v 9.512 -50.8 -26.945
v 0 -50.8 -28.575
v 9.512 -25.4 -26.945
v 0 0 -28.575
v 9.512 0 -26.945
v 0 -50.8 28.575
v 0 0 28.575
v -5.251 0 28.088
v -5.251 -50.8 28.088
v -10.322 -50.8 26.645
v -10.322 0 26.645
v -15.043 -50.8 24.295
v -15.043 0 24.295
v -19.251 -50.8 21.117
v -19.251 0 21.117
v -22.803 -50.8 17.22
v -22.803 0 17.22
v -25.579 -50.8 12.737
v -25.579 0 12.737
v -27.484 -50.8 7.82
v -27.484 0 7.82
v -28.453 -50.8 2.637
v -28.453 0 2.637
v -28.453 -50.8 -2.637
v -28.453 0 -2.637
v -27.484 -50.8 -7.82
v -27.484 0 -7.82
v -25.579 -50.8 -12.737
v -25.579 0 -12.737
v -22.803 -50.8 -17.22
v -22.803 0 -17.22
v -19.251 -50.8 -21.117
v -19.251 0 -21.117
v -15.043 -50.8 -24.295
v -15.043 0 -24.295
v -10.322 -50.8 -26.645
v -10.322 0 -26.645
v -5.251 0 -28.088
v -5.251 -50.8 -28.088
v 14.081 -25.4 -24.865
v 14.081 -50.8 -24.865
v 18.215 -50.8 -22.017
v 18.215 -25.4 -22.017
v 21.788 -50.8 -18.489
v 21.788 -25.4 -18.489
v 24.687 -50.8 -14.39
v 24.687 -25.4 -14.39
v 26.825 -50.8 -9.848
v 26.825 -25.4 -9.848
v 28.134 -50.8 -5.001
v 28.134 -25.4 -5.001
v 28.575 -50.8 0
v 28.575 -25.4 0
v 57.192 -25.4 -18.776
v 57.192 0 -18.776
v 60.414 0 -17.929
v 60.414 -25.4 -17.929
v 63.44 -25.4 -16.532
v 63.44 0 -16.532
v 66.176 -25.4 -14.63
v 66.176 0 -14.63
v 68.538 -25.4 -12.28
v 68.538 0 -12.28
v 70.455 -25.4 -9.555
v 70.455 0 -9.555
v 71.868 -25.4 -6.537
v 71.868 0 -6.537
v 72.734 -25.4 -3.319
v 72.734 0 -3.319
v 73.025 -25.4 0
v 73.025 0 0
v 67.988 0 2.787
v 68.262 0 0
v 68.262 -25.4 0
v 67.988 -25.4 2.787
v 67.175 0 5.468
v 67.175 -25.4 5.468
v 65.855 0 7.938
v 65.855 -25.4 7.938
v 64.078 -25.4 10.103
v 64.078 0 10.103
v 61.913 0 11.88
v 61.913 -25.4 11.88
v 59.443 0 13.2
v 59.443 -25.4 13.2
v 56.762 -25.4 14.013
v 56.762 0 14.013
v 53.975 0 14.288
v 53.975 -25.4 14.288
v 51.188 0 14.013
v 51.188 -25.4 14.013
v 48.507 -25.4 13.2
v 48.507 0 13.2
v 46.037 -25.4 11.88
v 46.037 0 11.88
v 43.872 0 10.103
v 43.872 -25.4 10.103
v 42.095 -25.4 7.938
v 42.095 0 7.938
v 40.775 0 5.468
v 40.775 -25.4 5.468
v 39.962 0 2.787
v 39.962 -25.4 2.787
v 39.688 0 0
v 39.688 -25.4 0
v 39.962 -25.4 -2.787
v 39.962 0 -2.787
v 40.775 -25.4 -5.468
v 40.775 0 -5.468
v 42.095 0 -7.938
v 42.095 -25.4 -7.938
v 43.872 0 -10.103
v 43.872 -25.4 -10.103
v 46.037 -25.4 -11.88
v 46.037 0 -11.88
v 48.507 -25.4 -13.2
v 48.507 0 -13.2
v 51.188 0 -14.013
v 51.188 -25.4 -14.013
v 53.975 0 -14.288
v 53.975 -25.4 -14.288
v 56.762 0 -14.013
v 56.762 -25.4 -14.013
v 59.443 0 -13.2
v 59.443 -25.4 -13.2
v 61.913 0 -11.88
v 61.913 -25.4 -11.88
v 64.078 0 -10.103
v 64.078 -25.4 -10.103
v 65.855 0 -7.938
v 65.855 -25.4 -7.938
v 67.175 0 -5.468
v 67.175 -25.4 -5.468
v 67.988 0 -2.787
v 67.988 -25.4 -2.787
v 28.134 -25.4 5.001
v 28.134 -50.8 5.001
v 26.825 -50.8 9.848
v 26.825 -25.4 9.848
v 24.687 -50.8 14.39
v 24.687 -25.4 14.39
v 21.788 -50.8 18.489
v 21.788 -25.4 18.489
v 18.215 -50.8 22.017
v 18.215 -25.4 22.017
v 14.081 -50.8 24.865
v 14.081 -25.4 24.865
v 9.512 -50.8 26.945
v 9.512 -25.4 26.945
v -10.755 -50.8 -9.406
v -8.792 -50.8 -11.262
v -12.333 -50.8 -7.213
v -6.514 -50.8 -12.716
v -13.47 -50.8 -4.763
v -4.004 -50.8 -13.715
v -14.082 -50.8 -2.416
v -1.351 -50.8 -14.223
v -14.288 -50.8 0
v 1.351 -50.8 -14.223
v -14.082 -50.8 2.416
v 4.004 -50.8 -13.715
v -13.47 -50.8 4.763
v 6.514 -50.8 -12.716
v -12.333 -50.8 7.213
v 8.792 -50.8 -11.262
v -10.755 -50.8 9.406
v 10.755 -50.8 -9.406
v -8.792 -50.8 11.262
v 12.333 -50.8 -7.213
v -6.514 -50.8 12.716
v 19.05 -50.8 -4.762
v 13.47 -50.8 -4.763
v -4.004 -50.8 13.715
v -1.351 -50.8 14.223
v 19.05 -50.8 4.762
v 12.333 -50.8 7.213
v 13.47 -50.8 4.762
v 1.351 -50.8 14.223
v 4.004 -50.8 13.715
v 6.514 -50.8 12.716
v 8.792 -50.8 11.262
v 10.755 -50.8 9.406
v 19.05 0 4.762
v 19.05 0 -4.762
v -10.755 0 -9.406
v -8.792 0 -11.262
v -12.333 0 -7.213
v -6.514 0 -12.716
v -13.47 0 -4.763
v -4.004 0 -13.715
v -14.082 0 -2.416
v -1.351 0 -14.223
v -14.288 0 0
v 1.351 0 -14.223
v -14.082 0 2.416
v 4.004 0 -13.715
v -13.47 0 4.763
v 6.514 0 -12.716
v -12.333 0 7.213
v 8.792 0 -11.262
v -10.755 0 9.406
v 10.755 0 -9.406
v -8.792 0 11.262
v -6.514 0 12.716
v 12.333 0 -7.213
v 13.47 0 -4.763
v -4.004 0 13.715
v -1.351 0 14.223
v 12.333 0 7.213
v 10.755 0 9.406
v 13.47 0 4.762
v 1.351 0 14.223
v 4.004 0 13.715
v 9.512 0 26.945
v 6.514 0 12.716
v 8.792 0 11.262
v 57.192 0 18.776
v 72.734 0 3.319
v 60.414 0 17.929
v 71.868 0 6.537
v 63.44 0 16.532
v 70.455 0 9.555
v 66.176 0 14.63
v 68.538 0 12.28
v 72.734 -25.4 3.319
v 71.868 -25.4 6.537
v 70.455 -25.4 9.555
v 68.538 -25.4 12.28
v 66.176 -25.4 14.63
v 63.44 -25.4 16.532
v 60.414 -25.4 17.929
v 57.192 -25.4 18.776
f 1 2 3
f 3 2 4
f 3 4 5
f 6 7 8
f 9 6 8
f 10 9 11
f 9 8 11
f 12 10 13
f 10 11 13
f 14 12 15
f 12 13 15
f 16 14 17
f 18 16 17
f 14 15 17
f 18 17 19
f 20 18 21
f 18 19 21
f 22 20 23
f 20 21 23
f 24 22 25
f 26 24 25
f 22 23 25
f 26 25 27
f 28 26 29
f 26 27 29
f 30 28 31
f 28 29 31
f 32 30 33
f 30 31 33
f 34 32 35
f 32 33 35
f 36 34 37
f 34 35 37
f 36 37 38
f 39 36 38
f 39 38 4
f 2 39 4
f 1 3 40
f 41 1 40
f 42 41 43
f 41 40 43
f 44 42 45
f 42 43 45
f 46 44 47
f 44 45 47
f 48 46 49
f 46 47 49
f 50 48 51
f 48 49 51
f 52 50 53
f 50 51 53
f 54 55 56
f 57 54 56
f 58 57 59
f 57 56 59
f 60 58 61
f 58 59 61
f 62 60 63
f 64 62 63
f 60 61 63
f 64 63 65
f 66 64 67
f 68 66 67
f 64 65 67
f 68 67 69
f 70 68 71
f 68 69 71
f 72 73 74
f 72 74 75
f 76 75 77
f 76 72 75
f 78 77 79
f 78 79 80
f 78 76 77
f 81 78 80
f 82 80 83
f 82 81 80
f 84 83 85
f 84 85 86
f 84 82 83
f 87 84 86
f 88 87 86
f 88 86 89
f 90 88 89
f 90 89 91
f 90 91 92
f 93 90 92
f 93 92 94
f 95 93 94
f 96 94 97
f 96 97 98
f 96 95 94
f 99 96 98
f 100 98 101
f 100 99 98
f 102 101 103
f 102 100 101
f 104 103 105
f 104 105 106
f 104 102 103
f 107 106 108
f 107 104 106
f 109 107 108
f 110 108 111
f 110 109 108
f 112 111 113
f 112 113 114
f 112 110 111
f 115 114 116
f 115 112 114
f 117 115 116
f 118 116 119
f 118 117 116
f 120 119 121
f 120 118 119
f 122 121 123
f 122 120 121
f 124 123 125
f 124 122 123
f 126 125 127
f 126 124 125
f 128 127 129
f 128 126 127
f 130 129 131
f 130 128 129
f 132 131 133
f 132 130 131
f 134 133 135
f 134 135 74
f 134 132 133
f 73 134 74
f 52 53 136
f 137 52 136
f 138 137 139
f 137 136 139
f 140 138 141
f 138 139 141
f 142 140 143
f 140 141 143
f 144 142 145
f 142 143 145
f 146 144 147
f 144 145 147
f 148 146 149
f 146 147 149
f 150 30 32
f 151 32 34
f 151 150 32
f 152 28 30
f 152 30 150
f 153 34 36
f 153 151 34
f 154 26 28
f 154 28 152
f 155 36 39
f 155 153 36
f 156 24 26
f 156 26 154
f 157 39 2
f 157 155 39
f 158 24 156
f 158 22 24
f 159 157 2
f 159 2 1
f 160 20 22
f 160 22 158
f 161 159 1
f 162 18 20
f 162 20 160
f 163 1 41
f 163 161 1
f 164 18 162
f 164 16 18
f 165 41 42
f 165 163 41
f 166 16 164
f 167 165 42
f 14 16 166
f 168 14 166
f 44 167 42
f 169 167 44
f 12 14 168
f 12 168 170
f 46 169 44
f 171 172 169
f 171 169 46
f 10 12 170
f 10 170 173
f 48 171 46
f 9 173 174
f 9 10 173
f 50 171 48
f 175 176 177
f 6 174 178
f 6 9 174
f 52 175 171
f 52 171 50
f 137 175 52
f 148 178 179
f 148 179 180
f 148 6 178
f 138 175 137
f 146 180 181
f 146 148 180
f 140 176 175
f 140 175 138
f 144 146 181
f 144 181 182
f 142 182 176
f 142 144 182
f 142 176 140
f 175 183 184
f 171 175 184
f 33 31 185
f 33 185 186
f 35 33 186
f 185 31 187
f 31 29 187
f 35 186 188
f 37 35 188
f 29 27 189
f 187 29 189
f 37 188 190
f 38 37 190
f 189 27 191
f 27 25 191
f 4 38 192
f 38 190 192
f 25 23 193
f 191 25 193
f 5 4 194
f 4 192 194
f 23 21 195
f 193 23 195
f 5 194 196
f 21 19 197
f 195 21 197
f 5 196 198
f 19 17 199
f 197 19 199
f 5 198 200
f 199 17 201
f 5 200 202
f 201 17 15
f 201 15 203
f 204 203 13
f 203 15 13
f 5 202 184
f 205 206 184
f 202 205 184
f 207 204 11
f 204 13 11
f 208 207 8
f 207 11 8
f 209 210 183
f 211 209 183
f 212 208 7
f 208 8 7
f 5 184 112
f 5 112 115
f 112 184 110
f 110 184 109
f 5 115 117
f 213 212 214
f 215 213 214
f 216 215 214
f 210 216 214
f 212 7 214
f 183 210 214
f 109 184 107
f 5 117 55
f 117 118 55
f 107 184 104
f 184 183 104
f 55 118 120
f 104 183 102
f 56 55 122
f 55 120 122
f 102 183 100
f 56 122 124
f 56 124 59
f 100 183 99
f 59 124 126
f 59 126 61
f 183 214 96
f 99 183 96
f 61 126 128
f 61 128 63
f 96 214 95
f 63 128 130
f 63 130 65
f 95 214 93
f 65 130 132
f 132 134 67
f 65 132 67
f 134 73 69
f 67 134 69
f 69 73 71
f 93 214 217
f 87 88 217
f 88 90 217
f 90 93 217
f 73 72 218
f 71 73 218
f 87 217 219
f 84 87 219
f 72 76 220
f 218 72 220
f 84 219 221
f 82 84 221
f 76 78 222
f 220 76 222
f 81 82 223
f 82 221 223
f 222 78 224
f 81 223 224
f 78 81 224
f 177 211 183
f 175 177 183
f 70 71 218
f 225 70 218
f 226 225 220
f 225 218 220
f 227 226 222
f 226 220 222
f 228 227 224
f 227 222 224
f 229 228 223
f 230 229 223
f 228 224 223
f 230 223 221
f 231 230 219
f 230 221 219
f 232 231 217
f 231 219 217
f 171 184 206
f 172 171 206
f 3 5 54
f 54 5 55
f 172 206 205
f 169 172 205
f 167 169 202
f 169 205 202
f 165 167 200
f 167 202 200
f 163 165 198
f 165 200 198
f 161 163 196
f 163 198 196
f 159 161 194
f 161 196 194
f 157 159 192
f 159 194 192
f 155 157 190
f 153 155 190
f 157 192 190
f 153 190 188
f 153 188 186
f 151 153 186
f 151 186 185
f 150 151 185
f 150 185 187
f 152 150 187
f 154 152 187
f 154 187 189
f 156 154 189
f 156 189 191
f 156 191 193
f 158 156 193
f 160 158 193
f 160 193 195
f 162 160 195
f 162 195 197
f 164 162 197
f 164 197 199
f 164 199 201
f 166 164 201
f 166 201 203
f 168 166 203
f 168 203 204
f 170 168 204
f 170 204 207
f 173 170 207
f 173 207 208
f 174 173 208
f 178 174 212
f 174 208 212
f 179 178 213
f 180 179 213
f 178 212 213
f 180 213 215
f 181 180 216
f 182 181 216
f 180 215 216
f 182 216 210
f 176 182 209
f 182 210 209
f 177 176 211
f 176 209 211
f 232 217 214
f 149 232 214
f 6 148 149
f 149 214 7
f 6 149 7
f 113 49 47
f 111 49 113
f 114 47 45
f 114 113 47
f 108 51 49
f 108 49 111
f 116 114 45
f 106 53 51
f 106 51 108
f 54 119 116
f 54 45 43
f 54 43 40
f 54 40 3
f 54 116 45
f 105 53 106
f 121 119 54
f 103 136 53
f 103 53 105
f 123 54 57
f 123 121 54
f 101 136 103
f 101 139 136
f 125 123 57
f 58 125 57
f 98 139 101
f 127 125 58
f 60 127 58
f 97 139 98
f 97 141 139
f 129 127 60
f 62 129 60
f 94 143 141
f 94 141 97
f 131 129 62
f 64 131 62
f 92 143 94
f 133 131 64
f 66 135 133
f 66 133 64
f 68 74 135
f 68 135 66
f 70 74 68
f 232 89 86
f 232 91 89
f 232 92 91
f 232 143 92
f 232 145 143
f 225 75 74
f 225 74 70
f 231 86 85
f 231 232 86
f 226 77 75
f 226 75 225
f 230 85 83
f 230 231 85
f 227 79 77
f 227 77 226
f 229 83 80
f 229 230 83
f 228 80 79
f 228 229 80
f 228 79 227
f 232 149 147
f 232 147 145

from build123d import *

# Parameters (mm, degrees)
F0_R     = 14.2875
F1_DEPTH = 25.4
F2_DEPTH = 50.8


with BuildPart() as f1:
    # F0 (on Front) → F1 (new body)
    with BuildSketch(Plane.XZ):
        with BuildLine():
            Line((9.5121844836, 26.9452959039), (0, 28.575))
            ThreePointArc((0, 28.575), (-28.575, 0), (0, -28.575))
            Line((0, -28.575), (9.5121844836, -26.9452959039))
            ThreePointArc((9.5121844836, -26.9452959039), (23.3274655355, -16.5033322905), (28.575, 0))
            ThreePointArc((28.575, 0), (23.3274655355, 16.5033322905), (9.5121844836, 26.9452959039))
        make_face()
        with BuildLine():
            ThreePointArc((-13.4703841816, 4.7625), (0, 14.2875), (13.4703841816, 4.7625))
            Line((13.4703841816, 4.7625), (19.05, 4.7625))
            Line((19.05, 4.7625), (19.05, -4.7625))
            Line((19.05, -4.7625), (13.4703841816, -4.7625))
            ThreePointArc((13.4703841816, -4.7625), (0, -14.2875), (-13.4703841816, -4.7625))
            Line((-13.4703841816, -4.7625), (-19.05, -4.7625))
            Line((-19.05, -4.7625), (-19.05, 4.7625))
            Line((-19.05, 4.7625), (-13.4703841816, 4.7625))
        make_face(mode=Mode.SUBTRACT)
        with BuildLine():
            Line((57.1919272622, 18.7764181619), (9.5121844836, 26.9452959039))
            ThreePointArc((9.5121844836, 26.9452959039), (23.3274655355, 16.5033322905), (28.575, 0))
            ThreePointArc((28.575, 0), (23.3274655355, -16.5033322905), (9.5121844836, -26.9452959039))
            Line((9.5121844836, -26.9452959039), (57.1919272622, -18.7764181619))
            ThreePointArc((57.1919272622, -18.7764181619), (34.925, 0), (57.1919272622, 18.7764181619))
        make_face()
        with BuildLine():
            ThreePointArc((73.025, 0), (68.5383952831, 12.2804730295), (57.1919272622, 18.7764181619))
            ThreePointArc((57.1919272622, 18.7764181619), (34.925, 0), (57.1919272622, -18.7764181619))
            ThreePointArc((57.1919272622, -18.7764181619), (68.5383952831, -12.2804730295), (73.025, 0))
        make_face()
        with Locations((53.975, 0)):
            Circle(F0_R, mode=Mode.SUBTRACT)
        with BuildLine():
            ThreePointArc((-13.4703841816, -4.7625), (-14.2875, 0), (-13.4703841816, 4.7625))
            Line((-13.4703841816, 4.7625), (-19.05, 4.7625))
            Line((-19.05, 4.7625), (-19.05, -4.7625))
            Line((-19.05, -4.7625), (-13.4703841816, -4.7625))
        make_face()
    extrude(amount=F1_DEPTH)

    # F0 (on Front) → F2 (join)
    with BuildSketch(Plane.XZ):
        with BuildLine():
            Line((9.5121844836, 26.9452959039), (0, 28.575))
            ThreePointArc((0, 28.575), (-28.575, 0), (0, -28.575))
            Line((0, -28.575), (9.5121844836, -26.9452959039))
            ThreePointArc((9.5121844836, -26.9452959039), (23.3274655355, -16.5033322905), (28.575, 0))
            ThreePointArc((28.575, 0), (23.3274655355, 16.5033322905), (9.5121844836, 26.9452959039))
        make_face()
        with BuildLine():
            ThreePointArc((-13.4703841816, 4.7625), (0, 14.2875), (13.4703841816, 4.7625))
            Line((13.4703841816, 4.7625), (19.05, 4.7625))
            Line((19.05, 4.7625), (19.05, -4.7625))
            Line((19.05, -4.7625), (13.4703841816, -4.7625))
            ThreePointArc((13.4703841816, -4.7625), (0, -14.2875), (-13.4703841816, -4.7625))
            Line((-13.4703841816, -4.7625), (-19.05, -4.7625))
            Line((-19.05, -4.7625), (-19.05, 4.7625))
            Line((-19.05, 4.7625), (-13.4703841816, 4.7625))
        make_face(mode=Mode.SUBTRACT)
        with BuildLine():
            ThreePointArc((-13.4703841816, -4.7625), (-14.2875, 0), (-13.4703841816, 4.7625))
            Line((-13.4703841816, 4.7625), (-19.05, 4.7625))
            Line((-19.05, 4.7625), (-19.05, -4.7625))
            Line((-19.05, -4.7625), (-13.4703841816, -4.7625))
        make_face()
    extrude(amount=F2_DEPTH)


solid = f1.part
